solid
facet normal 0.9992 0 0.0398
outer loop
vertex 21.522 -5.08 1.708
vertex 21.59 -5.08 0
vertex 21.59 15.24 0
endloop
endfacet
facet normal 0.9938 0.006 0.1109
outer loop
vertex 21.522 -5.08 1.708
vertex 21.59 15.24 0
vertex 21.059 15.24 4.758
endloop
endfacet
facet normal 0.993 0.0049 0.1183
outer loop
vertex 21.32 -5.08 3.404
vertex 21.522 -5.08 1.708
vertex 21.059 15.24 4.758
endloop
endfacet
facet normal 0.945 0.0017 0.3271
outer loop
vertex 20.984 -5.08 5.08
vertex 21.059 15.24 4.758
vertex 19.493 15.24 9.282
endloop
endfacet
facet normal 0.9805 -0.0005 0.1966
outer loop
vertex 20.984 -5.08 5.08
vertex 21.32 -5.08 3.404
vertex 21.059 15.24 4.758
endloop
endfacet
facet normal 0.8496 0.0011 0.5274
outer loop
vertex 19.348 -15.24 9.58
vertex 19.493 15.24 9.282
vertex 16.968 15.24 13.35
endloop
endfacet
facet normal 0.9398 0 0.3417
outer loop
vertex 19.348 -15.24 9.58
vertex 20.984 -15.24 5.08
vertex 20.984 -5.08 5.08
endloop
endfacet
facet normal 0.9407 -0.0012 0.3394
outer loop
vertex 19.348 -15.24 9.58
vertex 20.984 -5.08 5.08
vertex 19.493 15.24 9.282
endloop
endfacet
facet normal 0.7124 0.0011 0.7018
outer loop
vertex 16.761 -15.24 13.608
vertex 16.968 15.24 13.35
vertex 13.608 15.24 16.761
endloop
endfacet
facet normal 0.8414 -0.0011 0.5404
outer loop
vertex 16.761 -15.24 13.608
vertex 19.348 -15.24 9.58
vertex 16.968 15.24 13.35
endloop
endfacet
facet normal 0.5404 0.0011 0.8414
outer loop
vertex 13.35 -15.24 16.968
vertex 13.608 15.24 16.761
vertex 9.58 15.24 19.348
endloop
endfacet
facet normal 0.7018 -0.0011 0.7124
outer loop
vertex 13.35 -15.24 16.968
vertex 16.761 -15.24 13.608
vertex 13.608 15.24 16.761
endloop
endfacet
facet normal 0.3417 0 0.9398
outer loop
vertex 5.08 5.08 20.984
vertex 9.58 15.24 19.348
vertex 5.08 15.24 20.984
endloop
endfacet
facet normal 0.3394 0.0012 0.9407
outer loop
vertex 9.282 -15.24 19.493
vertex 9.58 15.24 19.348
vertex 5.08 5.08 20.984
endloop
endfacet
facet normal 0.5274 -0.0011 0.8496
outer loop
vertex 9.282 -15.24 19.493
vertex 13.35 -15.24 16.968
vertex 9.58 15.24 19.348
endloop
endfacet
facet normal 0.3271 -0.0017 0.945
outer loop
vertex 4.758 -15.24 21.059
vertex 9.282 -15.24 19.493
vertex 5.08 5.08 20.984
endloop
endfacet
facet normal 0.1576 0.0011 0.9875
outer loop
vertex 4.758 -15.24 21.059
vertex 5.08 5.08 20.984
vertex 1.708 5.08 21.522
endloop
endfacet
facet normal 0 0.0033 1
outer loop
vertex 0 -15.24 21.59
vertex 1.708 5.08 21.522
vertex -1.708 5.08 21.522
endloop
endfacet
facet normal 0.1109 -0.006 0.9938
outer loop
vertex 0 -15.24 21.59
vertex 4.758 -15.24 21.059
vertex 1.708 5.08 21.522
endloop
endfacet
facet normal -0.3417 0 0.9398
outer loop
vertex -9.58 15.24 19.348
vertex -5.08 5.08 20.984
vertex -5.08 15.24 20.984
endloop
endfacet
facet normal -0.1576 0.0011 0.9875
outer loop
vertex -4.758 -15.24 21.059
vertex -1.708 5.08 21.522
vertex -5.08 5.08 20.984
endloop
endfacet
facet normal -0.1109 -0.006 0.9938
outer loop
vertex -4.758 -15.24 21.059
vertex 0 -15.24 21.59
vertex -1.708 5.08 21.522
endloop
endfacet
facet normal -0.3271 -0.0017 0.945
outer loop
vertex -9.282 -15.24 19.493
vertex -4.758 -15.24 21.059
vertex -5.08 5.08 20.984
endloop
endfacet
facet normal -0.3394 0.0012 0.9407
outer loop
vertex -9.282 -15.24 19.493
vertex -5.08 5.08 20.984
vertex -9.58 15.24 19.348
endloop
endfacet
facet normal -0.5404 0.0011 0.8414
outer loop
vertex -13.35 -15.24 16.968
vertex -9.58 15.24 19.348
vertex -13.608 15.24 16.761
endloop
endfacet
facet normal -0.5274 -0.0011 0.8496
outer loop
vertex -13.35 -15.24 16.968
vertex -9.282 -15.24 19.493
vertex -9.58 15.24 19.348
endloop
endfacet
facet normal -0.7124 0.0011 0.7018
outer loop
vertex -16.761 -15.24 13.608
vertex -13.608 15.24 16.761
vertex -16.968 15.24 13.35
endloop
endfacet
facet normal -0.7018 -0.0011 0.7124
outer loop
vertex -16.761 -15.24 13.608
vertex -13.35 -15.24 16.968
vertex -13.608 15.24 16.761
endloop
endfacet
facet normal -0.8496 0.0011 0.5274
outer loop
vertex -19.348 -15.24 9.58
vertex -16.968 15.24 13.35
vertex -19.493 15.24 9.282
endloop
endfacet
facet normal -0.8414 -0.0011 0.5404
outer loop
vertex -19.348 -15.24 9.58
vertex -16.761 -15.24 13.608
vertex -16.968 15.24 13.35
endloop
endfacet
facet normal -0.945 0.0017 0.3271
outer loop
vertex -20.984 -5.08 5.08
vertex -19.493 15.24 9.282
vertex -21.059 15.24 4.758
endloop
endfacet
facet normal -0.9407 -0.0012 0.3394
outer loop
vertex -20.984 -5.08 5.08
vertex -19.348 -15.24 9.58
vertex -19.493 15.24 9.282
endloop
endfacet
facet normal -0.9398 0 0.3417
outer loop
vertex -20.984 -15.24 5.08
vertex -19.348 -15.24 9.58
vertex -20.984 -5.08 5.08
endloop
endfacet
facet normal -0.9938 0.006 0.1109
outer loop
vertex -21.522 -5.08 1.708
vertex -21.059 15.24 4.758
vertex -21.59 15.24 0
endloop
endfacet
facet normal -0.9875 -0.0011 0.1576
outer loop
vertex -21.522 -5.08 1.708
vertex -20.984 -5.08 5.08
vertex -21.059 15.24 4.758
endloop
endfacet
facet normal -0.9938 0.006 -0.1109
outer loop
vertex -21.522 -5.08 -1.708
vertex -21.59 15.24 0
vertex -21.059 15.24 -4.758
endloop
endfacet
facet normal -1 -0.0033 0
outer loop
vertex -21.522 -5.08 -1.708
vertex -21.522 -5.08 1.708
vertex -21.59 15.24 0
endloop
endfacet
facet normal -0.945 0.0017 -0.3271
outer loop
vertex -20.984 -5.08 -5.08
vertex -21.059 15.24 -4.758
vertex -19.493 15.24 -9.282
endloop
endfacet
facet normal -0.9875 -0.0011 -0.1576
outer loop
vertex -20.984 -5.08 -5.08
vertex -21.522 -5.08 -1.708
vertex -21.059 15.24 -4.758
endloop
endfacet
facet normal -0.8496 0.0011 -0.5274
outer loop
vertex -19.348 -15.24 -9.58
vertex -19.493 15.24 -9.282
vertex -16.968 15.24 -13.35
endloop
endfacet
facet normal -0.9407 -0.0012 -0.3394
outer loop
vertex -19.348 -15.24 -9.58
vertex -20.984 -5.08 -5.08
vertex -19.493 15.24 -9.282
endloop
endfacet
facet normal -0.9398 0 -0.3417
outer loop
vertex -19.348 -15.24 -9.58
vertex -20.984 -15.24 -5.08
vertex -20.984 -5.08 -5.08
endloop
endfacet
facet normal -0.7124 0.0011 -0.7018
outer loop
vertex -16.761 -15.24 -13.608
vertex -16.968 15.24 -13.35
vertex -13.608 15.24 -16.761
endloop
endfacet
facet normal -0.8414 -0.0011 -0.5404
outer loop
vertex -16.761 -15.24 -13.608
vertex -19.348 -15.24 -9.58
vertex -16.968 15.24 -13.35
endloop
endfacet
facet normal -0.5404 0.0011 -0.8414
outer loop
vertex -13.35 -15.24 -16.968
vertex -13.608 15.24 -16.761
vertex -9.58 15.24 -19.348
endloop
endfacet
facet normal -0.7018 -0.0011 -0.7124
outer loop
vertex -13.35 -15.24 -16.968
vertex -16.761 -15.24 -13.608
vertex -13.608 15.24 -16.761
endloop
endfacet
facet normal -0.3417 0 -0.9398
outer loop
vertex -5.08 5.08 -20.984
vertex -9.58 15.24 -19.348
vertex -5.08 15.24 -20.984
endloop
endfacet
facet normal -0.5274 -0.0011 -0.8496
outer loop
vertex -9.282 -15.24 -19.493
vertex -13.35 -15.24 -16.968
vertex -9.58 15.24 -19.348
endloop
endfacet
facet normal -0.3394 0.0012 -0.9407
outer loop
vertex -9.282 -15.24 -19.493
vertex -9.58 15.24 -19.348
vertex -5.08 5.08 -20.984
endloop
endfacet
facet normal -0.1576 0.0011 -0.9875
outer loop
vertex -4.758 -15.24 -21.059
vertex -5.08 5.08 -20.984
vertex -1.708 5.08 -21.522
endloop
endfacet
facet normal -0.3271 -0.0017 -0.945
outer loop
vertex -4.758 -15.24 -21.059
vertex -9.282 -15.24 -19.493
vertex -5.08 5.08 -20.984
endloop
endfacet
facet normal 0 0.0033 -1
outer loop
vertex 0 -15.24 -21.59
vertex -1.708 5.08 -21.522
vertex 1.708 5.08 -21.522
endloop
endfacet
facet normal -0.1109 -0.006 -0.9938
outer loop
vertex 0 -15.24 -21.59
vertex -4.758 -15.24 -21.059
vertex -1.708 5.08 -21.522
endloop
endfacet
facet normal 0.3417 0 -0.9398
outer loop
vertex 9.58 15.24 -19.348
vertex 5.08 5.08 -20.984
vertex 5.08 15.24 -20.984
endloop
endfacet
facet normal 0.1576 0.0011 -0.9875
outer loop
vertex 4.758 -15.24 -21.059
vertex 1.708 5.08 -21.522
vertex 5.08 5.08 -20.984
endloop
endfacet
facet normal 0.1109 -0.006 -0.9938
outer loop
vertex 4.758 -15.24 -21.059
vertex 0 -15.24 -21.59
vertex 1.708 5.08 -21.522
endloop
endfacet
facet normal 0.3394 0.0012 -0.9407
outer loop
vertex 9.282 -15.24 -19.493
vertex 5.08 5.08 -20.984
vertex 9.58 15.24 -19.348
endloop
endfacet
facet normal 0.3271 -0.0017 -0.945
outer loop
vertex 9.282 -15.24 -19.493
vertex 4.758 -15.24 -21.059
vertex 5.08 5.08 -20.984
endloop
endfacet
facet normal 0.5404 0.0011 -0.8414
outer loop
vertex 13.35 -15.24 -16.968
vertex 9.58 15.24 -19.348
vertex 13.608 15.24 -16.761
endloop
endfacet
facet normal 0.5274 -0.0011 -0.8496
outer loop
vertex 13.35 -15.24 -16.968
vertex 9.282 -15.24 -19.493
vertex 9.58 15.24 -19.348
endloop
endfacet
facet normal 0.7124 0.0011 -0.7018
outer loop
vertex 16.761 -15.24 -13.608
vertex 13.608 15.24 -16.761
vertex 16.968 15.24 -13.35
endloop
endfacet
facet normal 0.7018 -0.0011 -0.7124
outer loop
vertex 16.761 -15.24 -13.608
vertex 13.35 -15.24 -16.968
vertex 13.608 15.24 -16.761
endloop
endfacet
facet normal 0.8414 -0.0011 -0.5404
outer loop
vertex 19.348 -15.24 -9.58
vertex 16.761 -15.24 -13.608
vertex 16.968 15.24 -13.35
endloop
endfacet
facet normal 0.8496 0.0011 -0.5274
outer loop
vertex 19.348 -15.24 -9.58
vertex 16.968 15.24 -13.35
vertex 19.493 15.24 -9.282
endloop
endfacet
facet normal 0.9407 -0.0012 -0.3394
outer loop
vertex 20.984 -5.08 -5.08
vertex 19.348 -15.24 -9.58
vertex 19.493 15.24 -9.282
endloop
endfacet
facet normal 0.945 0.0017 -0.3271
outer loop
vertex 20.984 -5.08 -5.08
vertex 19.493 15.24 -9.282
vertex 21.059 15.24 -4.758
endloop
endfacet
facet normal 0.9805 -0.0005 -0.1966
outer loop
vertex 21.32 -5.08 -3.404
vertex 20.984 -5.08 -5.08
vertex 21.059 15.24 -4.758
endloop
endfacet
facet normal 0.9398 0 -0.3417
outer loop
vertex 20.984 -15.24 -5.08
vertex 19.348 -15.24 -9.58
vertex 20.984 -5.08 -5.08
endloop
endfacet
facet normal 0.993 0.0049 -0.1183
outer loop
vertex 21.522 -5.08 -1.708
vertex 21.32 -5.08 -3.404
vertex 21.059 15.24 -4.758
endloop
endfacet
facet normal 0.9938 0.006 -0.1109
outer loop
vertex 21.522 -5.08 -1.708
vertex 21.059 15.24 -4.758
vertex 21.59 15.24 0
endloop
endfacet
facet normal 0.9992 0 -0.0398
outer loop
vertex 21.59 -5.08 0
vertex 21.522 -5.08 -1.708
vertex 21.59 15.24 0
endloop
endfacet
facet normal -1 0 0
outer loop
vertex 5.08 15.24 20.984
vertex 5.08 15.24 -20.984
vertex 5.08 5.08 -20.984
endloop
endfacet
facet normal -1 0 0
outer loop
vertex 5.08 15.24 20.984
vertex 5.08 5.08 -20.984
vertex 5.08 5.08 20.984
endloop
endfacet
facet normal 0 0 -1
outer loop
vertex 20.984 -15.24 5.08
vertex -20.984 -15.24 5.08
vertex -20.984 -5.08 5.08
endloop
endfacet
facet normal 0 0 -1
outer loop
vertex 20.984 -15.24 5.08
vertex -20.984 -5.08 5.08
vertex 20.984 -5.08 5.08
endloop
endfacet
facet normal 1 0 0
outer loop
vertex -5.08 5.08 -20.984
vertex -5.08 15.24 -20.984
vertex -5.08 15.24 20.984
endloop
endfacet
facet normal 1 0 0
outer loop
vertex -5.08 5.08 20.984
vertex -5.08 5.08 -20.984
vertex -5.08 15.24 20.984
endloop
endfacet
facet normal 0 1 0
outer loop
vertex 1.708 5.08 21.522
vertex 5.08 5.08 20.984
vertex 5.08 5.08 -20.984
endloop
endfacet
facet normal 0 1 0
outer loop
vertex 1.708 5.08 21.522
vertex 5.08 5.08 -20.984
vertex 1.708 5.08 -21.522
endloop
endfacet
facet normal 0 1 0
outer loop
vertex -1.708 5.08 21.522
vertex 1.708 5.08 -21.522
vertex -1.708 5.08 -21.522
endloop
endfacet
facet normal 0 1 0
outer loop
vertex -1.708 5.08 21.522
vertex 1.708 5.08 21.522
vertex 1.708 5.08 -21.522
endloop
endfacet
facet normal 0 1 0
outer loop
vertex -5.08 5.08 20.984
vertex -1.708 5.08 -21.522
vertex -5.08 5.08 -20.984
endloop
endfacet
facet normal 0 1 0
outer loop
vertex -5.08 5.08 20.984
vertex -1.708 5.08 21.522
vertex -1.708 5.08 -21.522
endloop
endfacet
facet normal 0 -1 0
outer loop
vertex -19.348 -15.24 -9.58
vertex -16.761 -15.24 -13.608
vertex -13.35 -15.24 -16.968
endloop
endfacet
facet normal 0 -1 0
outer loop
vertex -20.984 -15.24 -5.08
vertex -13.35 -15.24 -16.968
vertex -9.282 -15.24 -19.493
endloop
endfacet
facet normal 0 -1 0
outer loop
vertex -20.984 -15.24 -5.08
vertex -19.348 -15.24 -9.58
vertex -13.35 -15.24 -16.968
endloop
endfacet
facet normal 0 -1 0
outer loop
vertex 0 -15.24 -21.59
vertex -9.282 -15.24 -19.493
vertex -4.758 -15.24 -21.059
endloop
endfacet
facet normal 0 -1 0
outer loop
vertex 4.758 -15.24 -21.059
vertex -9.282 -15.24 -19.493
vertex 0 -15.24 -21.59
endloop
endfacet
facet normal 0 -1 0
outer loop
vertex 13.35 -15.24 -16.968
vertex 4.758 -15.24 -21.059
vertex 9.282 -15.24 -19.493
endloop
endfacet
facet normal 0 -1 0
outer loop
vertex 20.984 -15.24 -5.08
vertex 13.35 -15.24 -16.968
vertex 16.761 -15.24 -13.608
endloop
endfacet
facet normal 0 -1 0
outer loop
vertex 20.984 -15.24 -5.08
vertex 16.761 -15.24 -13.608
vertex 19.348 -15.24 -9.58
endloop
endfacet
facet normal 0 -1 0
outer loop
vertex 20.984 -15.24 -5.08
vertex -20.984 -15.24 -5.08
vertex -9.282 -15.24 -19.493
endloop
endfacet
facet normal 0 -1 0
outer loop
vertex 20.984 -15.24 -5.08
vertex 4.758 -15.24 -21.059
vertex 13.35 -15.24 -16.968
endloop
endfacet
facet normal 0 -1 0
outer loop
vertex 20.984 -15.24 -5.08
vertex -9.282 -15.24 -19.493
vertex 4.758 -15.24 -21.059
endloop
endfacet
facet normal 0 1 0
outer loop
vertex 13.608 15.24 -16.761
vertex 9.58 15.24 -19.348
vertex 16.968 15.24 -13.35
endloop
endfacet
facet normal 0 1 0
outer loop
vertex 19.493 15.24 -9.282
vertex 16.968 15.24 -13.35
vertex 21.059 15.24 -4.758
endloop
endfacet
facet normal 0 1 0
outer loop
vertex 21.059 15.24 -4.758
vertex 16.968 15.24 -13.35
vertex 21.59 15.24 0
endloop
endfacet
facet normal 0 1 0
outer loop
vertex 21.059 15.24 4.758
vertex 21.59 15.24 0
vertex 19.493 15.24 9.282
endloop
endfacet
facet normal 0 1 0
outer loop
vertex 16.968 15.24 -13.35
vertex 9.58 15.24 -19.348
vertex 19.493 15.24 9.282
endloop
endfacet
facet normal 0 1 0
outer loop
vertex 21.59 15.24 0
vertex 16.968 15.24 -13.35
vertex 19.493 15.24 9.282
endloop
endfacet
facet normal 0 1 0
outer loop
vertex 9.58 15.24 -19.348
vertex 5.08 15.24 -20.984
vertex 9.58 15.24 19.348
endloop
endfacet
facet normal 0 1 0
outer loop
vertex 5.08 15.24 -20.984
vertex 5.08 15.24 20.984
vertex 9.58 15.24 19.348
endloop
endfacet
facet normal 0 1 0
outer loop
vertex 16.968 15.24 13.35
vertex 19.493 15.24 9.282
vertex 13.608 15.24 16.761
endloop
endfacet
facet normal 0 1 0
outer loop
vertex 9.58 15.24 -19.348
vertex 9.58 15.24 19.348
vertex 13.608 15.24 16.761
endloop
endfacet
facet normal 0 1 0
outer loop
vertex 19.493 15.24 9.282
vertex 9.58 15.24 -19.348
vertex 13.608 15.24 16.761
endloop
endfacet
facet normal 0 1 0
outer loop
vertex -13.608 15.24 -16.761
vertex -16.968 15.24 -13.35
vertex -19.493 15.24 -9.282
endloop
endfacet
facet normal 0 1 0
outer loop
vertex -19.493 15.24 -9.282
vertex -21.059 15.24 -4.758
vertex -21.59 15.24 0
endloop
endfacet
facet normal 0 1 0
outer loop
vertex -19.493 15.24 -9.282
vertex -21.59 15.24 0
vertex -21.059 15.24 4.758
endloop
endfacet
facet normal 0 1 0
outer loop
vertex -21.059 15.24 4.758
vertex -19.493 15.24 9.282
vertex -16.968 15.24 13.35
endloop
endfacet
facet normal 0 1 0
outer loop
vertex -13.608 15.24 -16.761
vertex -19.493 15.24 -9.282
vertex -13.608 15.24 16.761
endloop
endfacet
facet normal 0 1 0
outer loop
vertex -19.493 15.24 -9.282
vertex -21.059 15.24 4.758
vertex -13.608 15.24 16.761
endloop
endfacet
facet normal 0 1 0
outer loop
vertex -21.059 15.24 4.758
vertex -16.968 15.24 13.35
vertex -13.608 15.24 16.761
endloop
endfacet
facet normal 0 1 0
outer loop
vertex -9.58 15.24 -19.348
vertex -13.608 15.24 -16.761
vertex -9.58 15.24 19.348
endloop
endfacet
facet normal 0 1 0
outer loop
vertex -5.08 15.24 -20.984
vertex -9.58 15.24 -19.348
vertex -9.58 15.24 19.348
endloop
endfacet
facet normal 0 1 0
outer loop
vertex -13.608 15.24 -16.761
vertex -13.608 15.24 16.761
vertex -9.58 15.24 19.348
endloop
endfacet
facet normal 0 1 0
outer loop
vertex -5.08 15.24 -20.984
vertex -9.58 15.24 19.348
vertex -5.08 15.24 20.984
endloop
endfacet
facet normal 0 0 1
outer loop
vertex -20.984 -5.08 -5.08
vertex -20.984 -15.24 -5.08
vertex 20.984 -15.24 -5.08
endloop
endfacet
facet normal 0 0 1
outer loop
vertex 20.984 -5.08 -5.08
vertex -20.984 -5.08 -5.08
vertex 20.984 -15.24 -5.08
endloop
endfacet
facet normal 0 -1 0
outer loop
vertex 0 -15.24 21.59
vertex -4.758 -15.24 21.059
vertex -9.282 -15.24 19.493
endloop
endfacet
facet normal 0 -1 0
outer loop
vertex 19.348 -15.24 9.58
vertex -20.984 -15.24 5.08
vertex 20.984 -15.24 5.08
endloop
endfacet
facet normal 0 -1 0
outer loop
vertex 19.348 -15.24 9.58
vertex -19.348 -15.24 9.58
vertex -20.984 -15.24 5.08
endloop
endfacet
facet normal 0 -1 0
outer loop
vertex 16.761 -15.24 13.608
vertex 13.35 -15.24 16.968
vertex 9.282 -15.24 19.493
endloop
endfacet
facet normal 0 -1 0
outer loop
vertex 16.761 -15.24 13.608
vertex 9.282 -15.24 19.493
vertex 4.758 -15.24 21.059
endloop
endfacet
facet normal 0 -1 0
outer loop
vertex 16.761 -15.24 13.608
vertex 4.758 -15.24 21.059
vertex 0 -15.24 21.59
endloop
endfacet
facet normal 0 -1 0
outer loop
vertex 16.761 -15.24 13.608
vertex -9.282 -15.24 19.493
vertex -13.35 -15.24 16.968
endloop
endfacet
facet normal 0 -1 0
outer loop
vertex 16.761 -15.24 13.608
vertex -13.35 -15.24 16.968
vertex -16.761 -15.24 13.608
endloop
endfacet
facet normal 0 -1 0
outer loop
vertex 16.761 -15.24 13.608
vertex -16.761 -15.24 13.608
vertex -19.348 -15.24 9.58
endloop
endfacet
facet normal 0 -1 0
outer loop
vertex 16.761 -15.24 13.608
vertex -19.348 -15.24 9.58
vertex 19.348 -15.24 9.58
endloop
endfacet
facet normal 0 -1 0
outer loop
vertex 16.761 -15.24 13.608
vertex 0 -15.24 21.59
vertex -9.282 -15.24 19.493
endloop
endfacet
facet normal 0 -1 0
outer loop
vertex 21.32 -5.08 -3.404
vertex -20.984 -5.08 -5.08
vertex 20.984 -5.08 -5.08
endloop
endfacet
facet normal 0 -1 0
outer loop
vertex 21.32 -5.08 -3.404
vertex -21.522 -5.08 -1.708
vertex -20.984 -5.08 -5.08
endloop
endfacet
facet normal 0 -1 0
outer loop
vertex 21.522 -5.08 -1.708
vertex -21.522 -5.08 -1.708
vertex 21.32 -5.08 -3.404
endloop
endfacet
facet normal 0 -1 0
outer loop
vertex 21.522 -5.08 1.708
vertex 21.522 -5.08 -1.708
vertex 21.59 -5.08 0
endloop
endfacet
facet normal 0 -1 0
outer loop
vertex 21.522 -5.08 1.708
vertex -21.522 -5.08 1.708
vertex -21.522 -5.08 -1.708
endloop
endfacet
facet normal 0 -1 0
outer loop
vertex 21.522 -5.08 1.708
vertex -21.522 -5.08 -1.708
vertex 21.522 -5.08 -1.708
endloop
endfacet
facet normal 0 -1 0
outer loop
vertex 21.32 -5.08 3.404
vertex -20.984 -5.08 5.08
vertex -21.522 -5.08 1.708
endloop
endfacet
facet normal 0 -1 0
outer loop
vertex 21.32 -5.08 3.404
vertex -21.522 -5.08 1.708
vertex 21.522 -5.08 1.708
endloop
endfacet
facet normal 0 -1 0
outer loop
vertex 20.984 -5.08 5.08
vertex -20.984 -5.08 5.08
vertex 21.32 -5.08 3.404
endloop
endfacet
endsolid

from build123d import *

# Parameters (mm, degrees)
F0_R     = 21.59
F1_DEPTH = 15.24
F2_W     = 41.967688
F2_H     = 10.16
F3_DEPTH = 10.16
F4_W     = 10.16
F4_H     = 41.967688
F5_DEPTH = 10.16


with BuildPart() as f1:
    # F0 (on Front) → F1 (new body, symmetric)
    with BuildSketch(Plane.XZ):
        Circle(F0_R)
    extrude(amount=F1_DEPTH, both=True)

    # F2 (on face) → F3 (cut)
    with BuildSketch(Plane.XZ.offset(15.24)):
        Rectangle(F2_W, F2_H)
        with BuildLine():
            ThreePointArc((-20.983844, 5.08), (-21.59, 0), (-20.983844, -5.08))
            Line((-20.983844, -5.08), (-20.983844, 5.08))
        make_face()
        with BuildLine():
            Line((20.983844, 5.08), (20.983844, -5.08))
            ThreePointArc((20.983844, -5.08), (21.437925, -2.558018), (21.59, 0))
            ThreePointArc((21.59, 0), (21.437925, 2.558018), (20.983844, 5.08))
        make_face()
    extrude(amount=-F3_DEPTH, mode=Mode.SUBTRACT)

    # F4 (on face) → F5 (cut)
    with BuildSketch(Plane(origin=(0, 15.24, 0), x_dir=(-1, 0, 0), z_dir=(0, 1, 0))):
        with BuildLine():
            ThreePointArc((5.08, 20.983844), (0, 21.59), (-5.08, 20.983844))
            Line((-5.08, 20.983844), (5.08, 20.983844))
        make_face()
        Rectangle(F4_W, F4_H)
        with BuildLine():
            Line((5.08, -20.983844), (-5.08, -20.983844))
            ThreePointArc((-5.08, -20.983844), (0, -21.59), (5.08, -20.983844))
        make_face()
    extrude(amount=-F5_DEPTH, mode=Mode.SUBTRACT)


solid = f1.part
